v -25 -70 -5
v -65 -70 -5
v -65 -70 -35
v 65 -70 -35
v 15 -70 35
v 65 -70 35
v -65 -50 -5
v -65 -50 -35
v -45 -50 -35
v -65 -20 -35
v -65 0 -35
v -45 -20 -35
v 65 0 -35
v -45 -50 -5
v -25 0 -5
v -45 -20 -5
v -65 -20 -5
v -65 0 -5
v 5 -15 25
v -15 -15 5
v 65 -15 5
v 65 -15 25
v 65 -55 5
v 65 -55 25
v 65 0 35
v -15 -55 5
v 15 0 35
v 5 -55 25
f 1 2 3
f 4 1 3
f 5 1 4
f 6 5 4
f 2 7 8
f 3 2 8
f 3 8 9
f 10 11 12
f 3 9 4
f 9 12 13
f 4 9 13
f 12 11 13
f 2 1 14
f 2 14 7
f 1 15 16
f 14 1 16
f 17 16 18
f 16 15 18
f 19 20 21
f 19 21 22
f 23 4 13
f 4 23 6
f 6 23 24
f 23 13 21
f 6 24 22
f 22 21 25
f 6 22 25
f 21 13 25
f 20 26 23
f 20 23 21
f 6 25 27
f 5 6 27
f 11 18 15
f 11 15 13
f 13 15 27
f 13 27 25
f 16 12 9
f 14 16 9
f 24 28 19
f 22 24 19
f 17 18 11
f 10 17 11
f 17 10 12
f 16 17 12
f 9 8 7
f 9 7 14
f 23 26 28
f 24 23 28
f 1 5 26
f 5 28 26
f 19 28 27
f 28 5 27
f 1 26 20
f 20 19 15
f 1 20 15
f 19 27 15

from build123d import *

# Parameters (mm, degrees)
F1_DEPTH = 70
F2_W     = 20
F2_H     = 30
F3_DEPTH = 70.001
F4_W     = 40
F4_H     = 20
F5_DEPTH = 130.001


with BuildPart() as f1:
    # F0 (on Front) → F1 (new body)
    with BuildSketch(Plane.XZ):
        Polygon((65, -35), (65, 35), (15, 35), (-25, -5), (-65, -5), (-65, -35), (-25, -35), align=None)
    extrude(amount=F1_DEPTH)

    # F2 (on face) → F3 (cut, through all)
    with BuildSketch(Plane(origin=(0, 0, -35), x_dir=(1, 0, 0), z_dir=(0, 0, -1))):
        with Locations((-55, 35)):
            Rectangle(F2_W, F2_H)
    extrude(amount=-F3_DEPTH, mode=Mode.SUBTRACT)

    # F4 (on face) → F5 (cut, through all)
    with BuildSketch(Plane.YZ.offset(65)):
        with Locations((-35, 15)):
            Rectangle(F4_W, F4_H)
    extrude(amount=-F5_DEPTH, mode=Mode.SUBTRACT)


solid = f1.part
